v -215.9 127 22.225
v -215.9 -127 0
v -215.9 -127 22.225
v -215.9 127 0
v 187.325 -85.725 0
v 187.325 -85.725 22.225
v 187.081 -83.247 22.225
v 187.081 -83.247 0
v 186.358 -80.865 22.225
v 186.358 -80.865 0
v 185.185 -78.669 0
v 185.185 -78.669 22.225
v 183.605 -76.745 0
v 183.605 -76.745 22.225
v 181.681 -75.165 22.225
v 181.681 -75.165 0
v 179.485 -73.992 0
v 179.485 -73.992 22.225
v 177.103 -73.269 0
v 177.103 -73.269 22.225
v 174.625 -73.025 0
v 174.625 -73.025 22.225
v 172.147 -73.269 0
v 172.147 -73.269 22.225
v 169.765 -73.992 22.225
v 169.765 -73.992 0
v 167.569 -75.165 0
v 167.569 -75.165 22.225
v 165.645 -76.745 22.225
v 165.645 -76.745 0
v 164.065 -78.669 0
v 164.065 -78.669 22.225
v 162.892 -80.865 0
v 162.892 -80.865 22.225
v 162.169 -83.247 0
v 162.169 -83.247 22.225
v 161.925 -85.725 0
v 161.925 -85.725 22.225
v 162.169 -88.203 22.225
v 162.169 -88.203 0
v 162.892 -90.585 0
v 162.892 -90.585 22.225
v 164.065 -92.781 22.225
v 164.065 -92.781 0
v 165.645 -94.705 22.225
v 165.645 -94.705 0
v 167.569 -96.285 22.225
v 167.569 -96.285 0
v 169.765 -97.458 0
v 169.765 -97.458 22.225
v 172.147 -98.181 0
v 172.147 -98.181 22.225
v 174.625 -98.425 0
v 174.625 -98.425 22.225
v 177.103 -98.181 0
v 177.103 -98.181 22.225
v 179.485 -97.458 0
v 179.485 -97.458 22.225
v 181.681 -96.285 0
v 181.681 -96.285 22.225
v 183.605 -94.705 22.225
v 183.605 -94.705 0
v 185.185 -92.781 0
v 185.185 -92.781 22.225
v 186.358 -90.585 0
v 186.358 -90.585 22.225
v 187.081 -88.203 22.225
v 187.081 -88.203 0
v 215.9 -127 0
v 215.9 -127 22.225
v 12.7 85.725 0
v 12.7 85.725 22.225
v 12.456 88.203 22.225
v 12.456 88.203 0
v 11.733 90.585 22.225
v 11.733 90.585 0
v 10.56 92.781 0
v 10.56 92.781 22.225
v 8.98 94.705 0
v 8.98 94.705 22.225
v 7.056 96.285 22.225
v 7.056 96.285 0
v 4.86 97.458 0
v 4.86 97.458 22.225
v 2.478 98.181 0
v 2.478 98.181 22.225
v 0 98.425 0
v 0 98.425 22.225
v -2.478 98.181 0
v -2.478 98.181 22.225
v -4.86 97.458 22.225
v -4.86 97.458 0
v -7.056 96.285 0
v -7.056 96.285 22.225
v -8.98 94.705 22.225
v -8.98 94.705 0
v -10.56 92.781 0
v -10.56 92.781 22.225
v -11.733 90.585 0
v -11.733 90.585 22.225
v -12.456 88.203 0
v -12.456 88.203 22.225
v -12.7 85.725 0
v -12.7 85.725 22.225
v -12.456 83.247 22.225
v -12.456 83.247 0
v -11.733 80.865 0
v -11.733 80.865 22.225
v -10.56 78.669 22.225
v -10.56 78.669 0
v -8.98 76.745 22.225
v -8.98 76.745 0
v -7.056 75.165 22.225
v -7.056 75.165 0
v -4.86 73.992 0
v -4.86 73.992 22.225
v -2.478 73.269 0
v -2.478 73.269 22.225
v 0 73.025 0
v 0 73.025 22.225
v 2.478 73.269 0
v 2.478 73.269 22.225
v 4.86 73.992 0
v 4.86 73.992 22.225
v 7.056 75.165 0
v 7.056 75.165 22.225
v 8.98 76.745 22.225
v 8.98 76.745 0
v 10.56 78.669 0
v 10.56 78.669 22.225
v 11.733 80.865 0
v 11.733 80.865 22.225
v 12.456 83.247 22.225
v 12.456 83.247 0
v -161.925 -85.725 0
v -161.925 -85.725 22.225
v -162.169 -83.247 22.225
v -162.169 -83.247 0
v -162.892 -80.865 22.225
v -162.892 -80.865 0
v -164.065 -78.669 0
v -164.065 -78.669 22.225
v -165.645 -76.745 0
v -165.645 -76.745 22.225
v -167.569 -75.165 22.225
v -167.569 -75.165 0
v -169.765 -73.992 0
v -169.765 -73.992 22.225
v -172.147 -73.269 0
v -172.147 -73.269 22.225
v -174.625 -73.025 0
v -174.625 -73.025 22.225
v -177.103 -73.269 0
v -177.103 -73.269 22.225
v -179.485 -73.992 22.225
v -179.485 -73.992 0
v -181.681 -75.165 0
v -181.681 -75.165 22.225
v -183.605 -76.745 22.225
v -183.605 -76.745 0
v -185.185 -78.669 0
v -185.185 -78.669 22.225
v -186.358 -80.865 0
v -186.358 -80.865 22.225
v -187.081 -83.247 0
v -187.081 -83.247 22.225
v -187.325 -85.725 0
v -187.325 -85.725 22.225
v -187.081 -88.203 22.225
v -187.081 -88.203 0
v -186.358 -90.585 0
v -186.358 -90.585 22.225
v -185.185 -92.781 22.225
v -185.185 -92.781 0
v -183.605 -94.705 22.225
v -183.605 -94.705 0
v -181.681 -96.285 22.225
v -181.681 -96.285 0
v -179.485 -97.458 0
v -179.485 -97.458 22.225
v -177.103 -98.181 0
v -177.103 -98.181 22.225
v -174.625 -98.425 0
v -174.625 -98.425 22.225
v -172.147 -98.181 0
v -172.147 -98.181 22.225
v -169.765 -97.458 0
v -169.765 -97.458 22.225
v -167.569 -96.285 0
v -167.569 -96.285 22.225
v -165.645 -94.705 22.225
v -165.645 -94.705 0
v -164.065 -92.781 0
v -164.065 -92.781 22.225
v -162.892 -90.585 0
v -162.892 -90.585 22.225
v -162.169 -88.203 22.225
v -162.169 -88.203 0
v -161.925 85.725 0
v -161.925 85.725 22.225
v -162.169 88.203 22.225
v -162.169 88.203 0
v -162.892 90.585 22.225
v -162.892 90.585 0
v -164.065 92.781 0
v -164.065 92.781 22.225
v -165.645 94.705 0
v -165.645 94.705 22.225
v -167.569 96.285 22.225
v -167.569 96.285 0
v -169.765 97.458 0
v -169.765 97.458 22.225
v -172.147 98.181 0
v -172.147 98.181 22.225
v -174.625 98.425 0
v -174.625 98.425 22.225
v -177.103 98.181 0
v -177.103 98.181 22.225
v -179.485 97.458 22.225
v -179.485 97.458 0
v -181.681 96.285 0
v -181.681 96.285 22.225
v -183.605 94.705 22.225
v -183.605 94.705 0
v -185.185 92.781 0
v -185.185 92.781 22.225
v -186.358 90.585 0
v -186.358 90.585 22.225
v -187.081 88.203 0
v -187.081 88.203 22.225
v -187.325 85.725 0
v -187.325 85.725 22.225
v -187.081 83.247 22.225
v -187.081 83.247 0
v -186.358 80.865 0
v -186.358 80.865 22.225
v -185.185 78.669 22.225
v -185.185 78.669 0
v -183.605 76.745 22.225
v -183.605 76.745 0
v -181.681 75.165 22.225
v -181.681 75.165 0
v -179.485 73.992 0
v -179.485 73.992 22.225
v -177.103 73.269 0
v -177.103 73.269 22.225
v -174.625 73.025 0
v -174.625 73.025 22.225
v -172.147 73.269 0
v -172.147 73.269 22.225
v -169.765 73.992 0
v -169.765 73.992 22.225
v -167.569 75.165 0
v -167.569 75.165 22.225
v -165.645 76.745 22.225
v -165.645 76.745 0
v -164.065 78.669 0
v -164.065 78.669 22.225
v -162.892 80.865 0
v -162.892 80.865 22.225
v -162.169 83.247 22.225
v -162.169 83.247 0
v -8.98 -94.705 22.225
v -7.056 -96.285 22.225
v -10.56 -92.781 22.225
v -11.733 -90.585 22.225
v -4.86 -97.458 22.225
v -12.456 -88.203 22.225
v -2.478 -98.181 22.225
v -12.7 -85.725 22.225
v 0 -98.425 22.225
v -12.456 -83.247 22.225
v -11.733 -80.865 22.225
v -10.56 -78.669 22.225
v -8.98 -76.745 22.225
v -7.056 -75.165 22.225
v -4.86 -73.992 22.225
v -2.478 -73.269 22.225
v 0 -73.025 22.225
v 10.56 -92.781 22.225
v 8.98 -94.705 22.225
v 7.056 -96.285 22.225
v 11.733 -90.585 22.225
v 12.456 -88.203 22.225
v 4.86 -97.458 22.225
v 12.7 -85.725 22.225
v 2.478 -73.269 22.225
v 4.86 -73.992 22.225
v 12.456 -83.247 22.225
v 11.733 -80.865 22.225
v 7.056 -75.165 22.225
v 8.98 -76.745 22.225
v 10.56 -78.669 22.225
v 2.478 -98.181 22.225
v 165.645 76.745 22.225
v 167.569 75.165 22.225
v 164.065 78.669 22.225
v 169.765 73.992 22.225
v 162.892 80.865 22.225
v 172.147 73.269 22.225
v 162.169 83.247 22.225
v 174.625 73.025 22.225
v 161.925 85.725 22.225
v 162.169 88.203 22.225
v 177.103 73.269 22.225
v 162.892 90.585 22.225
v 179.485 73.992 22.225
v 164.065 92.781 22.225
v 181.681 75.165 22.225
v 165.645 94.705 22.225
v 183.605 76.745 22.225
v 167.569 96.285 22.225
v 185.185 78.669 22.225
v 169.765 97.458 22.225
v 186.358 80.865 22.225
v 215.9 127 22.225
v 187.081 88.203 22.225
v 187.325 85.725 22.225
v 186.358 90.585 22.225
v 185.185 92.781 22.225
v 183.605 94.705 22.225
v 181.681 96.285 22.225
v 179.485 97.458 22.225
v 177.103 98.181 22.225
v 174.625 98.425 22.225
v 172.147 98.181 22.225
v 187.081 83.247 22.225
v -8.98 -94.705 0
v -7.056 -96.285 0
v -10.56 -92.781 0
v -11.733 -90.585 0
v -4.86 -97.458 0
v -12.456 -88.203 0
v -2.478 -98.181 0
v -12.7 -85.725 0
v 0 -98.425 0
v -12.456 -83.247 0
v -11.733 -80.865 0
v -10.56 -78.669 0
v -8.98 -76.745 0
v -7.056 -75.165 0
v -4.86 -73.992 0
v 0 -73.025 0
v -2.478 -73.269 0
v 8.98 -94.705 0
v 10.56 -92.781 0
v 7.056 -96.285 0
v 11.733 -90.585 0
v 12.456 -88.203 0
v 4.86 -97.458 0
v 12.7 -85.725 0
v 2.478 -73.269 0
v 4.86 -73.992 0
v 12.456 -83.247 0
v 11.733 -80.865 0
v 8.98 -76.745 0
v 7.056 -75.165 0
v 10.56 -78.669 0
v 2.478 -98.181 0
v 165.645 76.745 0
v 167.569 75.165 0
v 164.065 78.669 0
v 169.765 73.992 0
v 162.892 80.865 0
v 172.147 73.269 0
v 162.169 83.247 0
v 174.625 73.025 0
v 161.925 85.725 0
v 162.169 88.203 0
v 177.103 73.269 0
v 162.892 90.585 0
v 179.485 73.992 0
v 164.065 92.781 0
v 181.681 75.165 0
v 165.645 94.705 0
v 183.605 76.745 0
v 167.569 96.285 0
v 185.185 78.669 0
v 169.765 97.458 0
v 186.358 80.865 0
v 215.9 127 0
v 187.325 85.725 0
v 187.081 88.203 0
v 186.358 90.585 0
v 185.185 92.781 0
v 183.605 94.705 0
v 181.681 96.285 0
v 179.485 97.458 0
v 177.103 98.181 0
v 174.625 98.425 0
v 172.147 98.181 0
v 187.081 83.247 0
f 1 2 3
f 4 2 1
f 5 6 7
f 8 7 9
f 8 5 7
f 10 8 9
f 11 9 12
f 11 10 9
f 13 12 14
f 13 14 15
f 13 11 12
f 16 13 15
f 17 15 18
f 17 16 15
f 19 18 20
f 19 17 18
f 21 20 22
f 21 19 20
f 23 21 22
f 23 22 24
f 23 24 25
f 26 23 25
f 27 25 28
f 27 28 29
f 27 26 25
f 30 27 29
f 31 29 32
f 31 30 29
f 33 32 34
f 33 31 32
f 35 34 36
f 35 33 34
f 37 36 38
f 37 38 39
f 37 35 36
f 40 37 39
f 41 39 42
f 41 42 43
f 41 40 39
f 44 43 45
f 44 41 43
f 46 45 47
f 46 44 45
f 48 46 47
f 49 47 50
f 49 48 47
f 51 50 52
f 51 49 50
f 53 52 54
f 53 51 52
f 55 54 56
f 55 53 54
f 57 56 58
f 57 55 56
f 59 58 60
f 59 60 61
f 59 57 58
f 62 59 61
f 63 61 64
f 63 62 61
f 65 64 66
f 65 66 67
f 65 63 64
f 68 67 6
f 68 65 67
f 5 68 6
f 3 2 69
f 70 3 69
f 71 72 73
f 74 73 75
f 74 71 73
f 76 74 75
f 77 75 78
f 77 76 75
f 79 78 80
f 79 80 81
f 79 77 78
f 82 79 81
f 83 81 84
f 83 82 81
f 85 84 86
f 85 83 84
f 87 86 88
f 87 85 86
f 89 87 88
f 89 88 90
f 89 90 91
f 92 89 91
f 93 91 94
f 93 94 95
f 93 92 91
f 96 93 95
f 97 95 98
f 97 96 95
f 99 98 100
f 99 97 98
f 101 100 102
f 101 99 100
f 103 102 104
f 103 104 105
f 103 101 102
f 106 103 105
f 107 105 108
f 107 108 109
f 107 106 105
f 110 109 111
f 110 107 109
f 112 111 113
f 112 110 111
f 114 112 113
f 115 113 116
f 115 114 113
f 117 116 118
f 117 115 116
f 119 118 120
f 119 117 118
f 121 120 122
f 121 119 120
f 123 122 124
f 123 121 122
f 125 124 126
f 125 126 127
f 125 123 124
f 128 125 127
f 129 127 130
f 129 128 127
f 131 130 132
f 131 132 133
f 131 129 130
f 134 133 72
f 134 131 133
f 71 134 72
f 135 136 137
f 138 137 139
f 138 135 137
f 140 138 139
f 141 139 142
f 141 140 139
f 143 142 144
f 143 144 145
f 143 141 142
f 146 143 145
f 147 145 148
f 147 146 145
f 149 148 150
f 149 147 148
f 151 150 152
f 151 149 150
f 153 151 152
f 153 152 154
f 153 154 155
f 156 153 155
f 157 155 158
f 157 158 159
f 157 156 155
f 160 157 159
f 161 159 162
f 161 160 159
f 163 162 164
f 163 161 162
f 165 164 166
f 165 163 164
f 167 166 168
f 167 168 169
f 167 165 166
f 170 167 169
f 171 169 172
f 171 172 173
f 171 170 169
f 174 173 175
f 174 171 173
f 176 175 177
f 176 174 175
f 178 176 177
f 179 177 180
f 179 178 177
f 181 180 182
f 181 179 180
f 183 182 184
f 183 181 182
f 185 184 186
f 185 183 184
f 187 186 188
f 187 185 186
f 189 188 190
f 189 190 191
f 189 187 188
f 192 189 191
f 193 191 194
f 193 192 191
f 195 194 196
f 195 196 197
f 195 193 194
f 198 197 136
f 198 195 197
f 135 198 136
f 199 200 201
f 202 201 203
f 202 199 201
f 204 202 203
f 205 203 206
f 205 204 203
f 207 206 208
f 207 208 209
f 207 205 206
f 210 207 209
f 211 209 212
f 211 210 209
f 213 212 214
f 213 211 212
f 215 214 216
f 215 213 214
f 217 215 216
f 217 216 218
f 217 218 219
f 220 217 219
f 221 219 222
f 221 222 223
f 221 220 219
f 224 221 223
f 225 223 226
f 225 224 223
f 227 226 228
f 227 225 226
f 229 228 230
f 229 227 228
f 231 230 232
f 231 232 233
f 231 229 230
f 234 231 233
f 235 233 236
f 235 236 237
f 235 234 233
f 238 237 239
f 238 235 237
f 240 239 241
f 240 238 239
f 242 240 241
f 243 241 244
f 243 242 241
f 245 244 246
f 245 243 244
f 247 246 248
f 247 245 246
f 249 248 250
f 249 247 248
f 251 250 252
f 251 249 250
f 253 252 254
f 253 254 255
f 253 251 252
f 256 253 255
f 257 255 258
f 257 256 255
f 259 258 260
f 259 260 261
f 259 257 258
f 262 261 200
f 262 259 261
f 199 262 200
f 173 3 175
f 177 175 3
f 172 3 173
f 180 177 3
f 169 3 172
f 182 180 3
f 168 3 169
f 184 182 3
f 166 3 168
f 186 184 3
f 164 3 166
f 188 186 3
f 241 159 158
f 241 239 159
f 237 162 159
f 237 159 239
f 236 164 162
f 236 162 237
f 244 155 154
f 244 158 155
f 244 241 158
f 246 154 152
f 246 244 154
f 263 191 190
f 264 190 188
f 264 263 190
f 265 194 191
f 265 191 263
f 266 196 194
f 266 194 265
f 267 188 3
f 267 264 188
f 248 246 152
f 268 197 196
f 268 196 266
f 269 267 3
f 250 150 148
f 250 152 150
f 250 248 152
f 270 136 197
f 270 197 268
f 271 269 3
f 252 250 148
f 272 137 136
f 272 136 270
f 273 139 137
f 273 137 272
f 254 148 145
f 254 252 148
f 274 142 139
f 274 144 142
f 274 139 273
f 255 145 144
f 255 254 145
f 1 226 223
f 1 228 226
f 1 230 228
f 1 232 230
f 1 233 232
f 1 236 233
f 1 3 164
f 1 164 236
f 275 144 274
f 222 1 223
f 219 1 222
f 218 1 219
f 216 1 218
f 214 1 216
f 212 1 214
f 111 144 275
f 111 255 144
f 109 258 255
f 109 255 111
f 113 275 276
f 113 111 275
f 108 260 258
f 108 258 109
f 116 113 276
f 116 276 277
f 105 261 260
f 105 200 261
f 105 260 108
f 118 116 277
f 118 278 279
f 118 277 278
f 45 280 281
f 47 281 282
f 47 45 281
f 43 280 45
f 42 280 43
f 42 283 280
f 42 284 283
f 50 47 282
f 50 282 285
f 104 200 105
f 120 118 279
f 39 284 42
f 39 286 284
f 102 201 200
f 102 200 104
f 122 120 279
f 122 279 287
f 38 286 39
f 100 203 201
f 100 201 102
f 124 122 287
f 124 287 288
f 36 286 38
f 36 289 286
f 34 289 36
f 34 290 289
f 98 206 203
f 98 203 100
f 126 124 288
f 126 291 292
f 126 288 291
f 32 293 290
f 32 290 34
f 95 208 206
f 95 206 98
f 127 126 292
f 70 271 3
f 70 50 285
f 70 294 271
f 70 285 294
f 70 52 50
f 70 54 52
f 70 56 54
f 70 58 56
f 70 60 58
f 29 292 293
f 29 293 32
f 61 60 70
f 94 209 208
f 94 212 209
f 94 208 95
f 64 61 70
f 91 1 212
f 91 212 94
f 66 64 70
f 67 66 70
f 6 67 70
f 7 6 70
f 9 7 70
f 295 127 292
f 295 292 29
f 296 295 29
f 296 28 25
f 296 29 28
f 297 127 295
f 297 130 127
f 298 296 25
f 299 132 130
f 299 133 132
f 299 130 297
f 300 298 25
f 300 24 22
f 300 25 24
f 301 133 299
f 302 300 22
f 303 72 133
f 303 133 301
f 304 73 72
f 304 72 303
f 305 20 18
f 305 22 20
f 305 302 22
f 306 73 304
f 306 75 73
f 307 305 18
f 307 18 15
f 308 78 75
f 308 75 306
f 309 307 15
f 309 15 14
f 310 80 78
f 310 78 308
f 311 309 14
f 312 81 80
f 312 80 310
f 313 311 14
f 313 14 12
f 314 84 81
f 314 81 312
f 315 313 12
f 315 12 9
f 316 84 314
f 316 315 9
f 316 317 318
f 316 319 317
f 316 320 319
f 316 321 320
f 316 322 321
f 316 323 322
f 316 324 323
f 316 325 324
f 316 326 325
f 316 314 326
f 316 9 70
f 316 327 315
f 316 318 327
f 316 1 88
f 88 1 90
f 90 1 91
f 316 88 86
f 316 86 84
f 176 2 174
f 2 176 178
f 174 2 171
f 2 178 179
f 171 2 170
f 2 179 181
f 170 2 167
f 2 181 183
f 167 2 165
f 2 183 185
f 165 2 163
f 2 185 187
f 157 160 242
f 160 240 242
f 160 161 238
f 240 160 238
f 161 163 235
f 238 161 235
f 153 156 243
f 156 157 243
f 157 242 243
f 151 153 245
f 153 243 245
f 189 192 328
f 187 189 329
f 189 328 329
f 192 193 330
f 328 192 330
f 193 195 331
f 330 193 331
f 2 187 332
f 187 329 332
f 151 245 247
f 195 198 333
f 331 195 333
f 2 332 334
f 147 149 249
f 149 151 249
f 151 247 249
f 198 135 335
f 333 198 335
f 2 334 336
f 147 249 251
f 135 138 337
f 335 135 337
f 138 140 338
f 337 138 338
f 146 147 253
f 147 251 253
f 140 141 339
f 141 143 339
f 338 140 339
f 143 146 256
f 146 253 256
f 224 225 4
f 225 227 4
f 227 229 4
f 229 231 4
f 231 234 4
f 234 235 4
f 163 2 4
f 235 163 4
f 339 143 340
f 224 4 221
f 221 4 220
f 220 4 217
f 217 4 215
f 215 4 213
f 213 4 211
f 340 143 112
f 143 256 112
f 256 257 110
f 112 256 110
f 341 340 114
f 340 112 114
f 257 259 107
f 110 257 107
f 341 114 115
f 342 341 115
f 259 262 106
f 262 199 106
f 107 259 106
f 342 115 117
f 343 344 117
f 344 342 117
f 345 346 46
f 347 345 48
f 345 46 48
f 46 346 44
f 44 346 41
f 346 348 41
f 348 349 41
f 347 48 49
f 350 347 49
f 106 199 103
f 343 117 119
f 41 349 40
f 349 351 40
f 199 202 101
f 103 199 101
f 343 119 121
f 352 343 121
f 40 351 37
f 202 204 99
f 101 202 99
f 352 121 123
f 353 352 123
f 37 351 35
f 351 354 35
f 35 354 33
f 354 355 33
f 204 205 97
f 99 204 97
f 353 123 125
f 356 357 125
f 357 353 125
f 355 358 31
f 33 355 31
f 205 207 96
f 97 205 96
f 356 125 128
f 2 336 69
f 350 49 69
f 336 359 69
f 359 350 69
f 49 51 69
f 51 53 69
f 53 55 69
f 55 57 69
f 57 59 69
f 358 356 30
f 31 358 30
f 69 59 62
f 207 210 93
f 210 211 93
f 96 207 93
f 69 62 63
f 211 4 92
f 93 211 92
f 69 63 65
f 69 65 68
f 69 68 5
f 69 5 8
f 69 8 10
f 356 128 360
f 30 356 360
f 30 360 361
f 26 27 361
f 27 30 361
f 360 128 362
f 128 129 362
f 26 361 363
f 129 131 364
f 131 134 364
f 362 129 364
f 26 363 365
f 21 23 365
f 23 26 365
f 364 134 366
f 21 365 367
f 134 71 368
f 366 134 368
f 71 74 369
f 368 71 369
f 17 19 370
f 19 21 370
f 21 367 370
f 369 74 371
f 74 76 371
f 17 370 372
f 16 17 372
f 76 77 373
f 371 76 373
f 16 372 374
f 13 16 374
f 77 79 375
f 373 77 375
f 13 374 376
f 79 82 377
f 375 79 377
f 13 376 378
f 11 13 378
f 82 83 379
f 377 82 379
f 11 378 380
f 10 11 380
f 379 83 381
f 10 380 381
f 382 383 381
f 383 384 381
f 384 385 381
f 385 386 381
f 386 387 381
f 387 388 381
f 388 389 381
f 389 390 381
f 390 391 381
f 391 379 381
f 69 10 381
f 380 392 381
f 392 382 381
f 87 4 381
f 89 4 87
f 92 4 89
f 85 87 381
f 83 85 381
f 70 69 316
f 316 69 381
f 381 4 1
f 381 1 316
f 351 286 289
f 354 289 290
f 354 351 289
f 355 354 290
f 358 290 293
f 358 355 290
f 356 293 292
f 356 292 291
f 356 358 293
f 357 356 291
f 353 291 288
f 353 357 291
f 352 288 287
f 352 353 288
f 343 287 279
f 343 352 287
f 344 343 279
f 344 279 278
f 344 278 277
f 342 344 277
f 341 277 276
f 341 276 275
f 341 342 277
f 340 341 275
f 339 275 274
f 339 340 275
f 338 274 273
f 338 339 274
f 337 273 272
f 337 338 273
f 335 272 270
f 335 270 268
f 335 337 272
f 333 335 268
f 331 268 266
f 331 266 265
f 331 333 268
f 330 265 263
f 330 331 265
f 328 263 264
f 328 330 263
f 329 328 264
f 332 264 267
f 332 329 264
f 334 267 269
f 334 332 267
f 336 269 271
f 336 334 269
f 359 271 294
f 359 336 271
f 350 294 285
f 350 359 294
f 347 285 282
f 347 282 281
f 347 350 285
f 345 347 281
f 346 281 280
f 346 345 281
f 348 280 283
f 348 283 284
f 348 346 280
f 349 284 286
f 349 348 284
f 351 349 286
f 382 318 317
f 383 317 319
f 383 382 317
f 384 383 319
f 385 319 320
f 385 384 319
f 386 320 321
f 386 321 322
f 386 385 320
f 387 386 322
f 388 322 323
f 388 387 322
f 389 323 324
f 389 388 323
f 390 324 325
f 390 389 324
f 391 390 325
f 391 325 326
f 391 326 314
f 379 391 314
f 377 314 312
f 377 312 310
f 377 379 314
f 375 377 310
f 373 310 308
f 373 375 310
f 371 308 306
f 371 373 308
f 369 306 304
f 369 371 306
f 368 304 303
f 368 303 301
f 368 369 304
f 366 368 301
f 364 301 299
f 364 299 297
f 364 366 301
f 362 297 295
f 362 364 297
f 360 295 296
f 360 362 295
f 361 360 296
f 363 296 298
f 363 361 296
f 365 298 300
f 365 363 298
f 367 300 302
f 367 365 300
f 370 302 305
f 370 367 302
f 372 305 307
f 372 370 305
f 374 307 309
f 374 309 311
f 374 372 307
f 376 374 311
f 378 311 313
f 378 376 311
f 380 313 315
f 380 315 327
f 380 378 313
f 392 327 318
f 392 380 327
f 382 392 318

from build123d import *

# Parameters (mm, degrees)
F0_W     = 431.8
F0_H     = 254
F0_R     = 12.7
F1_DEPTH = 22.225


with BuildPart() as f1:
    # F0 (on Top) → F1 (new body)
    with BuildSketch(Plane.XY):
        Rectangle(F0_W, F0_H)
        with Locations((-174.625, -85.725)):
            Circle(F0_R, mode=Mode.SUBTRACT)
        with Locations((0, -85.725)):
            Circle(F0_R, mode=Mode.SUBTRACT)
        with Locations((174.625, -85.725)):
            Circle(F0_R, mode=Mode.SUBTRACT)
        with Locations((-174.625, 85.725)):
            Circle(F0_R, mode=Mode.SUBTRACT)
        with Locations((0, 85.725)):
            Circle(F0_R, mode=Mode.SUBTRACT)
        with Locations((174.625, 85.725)):
            Circle(F0_R, mode=Mode.SUBTRACT)
    extrude(amount=F1_DEPTH)


solid = f1.part
